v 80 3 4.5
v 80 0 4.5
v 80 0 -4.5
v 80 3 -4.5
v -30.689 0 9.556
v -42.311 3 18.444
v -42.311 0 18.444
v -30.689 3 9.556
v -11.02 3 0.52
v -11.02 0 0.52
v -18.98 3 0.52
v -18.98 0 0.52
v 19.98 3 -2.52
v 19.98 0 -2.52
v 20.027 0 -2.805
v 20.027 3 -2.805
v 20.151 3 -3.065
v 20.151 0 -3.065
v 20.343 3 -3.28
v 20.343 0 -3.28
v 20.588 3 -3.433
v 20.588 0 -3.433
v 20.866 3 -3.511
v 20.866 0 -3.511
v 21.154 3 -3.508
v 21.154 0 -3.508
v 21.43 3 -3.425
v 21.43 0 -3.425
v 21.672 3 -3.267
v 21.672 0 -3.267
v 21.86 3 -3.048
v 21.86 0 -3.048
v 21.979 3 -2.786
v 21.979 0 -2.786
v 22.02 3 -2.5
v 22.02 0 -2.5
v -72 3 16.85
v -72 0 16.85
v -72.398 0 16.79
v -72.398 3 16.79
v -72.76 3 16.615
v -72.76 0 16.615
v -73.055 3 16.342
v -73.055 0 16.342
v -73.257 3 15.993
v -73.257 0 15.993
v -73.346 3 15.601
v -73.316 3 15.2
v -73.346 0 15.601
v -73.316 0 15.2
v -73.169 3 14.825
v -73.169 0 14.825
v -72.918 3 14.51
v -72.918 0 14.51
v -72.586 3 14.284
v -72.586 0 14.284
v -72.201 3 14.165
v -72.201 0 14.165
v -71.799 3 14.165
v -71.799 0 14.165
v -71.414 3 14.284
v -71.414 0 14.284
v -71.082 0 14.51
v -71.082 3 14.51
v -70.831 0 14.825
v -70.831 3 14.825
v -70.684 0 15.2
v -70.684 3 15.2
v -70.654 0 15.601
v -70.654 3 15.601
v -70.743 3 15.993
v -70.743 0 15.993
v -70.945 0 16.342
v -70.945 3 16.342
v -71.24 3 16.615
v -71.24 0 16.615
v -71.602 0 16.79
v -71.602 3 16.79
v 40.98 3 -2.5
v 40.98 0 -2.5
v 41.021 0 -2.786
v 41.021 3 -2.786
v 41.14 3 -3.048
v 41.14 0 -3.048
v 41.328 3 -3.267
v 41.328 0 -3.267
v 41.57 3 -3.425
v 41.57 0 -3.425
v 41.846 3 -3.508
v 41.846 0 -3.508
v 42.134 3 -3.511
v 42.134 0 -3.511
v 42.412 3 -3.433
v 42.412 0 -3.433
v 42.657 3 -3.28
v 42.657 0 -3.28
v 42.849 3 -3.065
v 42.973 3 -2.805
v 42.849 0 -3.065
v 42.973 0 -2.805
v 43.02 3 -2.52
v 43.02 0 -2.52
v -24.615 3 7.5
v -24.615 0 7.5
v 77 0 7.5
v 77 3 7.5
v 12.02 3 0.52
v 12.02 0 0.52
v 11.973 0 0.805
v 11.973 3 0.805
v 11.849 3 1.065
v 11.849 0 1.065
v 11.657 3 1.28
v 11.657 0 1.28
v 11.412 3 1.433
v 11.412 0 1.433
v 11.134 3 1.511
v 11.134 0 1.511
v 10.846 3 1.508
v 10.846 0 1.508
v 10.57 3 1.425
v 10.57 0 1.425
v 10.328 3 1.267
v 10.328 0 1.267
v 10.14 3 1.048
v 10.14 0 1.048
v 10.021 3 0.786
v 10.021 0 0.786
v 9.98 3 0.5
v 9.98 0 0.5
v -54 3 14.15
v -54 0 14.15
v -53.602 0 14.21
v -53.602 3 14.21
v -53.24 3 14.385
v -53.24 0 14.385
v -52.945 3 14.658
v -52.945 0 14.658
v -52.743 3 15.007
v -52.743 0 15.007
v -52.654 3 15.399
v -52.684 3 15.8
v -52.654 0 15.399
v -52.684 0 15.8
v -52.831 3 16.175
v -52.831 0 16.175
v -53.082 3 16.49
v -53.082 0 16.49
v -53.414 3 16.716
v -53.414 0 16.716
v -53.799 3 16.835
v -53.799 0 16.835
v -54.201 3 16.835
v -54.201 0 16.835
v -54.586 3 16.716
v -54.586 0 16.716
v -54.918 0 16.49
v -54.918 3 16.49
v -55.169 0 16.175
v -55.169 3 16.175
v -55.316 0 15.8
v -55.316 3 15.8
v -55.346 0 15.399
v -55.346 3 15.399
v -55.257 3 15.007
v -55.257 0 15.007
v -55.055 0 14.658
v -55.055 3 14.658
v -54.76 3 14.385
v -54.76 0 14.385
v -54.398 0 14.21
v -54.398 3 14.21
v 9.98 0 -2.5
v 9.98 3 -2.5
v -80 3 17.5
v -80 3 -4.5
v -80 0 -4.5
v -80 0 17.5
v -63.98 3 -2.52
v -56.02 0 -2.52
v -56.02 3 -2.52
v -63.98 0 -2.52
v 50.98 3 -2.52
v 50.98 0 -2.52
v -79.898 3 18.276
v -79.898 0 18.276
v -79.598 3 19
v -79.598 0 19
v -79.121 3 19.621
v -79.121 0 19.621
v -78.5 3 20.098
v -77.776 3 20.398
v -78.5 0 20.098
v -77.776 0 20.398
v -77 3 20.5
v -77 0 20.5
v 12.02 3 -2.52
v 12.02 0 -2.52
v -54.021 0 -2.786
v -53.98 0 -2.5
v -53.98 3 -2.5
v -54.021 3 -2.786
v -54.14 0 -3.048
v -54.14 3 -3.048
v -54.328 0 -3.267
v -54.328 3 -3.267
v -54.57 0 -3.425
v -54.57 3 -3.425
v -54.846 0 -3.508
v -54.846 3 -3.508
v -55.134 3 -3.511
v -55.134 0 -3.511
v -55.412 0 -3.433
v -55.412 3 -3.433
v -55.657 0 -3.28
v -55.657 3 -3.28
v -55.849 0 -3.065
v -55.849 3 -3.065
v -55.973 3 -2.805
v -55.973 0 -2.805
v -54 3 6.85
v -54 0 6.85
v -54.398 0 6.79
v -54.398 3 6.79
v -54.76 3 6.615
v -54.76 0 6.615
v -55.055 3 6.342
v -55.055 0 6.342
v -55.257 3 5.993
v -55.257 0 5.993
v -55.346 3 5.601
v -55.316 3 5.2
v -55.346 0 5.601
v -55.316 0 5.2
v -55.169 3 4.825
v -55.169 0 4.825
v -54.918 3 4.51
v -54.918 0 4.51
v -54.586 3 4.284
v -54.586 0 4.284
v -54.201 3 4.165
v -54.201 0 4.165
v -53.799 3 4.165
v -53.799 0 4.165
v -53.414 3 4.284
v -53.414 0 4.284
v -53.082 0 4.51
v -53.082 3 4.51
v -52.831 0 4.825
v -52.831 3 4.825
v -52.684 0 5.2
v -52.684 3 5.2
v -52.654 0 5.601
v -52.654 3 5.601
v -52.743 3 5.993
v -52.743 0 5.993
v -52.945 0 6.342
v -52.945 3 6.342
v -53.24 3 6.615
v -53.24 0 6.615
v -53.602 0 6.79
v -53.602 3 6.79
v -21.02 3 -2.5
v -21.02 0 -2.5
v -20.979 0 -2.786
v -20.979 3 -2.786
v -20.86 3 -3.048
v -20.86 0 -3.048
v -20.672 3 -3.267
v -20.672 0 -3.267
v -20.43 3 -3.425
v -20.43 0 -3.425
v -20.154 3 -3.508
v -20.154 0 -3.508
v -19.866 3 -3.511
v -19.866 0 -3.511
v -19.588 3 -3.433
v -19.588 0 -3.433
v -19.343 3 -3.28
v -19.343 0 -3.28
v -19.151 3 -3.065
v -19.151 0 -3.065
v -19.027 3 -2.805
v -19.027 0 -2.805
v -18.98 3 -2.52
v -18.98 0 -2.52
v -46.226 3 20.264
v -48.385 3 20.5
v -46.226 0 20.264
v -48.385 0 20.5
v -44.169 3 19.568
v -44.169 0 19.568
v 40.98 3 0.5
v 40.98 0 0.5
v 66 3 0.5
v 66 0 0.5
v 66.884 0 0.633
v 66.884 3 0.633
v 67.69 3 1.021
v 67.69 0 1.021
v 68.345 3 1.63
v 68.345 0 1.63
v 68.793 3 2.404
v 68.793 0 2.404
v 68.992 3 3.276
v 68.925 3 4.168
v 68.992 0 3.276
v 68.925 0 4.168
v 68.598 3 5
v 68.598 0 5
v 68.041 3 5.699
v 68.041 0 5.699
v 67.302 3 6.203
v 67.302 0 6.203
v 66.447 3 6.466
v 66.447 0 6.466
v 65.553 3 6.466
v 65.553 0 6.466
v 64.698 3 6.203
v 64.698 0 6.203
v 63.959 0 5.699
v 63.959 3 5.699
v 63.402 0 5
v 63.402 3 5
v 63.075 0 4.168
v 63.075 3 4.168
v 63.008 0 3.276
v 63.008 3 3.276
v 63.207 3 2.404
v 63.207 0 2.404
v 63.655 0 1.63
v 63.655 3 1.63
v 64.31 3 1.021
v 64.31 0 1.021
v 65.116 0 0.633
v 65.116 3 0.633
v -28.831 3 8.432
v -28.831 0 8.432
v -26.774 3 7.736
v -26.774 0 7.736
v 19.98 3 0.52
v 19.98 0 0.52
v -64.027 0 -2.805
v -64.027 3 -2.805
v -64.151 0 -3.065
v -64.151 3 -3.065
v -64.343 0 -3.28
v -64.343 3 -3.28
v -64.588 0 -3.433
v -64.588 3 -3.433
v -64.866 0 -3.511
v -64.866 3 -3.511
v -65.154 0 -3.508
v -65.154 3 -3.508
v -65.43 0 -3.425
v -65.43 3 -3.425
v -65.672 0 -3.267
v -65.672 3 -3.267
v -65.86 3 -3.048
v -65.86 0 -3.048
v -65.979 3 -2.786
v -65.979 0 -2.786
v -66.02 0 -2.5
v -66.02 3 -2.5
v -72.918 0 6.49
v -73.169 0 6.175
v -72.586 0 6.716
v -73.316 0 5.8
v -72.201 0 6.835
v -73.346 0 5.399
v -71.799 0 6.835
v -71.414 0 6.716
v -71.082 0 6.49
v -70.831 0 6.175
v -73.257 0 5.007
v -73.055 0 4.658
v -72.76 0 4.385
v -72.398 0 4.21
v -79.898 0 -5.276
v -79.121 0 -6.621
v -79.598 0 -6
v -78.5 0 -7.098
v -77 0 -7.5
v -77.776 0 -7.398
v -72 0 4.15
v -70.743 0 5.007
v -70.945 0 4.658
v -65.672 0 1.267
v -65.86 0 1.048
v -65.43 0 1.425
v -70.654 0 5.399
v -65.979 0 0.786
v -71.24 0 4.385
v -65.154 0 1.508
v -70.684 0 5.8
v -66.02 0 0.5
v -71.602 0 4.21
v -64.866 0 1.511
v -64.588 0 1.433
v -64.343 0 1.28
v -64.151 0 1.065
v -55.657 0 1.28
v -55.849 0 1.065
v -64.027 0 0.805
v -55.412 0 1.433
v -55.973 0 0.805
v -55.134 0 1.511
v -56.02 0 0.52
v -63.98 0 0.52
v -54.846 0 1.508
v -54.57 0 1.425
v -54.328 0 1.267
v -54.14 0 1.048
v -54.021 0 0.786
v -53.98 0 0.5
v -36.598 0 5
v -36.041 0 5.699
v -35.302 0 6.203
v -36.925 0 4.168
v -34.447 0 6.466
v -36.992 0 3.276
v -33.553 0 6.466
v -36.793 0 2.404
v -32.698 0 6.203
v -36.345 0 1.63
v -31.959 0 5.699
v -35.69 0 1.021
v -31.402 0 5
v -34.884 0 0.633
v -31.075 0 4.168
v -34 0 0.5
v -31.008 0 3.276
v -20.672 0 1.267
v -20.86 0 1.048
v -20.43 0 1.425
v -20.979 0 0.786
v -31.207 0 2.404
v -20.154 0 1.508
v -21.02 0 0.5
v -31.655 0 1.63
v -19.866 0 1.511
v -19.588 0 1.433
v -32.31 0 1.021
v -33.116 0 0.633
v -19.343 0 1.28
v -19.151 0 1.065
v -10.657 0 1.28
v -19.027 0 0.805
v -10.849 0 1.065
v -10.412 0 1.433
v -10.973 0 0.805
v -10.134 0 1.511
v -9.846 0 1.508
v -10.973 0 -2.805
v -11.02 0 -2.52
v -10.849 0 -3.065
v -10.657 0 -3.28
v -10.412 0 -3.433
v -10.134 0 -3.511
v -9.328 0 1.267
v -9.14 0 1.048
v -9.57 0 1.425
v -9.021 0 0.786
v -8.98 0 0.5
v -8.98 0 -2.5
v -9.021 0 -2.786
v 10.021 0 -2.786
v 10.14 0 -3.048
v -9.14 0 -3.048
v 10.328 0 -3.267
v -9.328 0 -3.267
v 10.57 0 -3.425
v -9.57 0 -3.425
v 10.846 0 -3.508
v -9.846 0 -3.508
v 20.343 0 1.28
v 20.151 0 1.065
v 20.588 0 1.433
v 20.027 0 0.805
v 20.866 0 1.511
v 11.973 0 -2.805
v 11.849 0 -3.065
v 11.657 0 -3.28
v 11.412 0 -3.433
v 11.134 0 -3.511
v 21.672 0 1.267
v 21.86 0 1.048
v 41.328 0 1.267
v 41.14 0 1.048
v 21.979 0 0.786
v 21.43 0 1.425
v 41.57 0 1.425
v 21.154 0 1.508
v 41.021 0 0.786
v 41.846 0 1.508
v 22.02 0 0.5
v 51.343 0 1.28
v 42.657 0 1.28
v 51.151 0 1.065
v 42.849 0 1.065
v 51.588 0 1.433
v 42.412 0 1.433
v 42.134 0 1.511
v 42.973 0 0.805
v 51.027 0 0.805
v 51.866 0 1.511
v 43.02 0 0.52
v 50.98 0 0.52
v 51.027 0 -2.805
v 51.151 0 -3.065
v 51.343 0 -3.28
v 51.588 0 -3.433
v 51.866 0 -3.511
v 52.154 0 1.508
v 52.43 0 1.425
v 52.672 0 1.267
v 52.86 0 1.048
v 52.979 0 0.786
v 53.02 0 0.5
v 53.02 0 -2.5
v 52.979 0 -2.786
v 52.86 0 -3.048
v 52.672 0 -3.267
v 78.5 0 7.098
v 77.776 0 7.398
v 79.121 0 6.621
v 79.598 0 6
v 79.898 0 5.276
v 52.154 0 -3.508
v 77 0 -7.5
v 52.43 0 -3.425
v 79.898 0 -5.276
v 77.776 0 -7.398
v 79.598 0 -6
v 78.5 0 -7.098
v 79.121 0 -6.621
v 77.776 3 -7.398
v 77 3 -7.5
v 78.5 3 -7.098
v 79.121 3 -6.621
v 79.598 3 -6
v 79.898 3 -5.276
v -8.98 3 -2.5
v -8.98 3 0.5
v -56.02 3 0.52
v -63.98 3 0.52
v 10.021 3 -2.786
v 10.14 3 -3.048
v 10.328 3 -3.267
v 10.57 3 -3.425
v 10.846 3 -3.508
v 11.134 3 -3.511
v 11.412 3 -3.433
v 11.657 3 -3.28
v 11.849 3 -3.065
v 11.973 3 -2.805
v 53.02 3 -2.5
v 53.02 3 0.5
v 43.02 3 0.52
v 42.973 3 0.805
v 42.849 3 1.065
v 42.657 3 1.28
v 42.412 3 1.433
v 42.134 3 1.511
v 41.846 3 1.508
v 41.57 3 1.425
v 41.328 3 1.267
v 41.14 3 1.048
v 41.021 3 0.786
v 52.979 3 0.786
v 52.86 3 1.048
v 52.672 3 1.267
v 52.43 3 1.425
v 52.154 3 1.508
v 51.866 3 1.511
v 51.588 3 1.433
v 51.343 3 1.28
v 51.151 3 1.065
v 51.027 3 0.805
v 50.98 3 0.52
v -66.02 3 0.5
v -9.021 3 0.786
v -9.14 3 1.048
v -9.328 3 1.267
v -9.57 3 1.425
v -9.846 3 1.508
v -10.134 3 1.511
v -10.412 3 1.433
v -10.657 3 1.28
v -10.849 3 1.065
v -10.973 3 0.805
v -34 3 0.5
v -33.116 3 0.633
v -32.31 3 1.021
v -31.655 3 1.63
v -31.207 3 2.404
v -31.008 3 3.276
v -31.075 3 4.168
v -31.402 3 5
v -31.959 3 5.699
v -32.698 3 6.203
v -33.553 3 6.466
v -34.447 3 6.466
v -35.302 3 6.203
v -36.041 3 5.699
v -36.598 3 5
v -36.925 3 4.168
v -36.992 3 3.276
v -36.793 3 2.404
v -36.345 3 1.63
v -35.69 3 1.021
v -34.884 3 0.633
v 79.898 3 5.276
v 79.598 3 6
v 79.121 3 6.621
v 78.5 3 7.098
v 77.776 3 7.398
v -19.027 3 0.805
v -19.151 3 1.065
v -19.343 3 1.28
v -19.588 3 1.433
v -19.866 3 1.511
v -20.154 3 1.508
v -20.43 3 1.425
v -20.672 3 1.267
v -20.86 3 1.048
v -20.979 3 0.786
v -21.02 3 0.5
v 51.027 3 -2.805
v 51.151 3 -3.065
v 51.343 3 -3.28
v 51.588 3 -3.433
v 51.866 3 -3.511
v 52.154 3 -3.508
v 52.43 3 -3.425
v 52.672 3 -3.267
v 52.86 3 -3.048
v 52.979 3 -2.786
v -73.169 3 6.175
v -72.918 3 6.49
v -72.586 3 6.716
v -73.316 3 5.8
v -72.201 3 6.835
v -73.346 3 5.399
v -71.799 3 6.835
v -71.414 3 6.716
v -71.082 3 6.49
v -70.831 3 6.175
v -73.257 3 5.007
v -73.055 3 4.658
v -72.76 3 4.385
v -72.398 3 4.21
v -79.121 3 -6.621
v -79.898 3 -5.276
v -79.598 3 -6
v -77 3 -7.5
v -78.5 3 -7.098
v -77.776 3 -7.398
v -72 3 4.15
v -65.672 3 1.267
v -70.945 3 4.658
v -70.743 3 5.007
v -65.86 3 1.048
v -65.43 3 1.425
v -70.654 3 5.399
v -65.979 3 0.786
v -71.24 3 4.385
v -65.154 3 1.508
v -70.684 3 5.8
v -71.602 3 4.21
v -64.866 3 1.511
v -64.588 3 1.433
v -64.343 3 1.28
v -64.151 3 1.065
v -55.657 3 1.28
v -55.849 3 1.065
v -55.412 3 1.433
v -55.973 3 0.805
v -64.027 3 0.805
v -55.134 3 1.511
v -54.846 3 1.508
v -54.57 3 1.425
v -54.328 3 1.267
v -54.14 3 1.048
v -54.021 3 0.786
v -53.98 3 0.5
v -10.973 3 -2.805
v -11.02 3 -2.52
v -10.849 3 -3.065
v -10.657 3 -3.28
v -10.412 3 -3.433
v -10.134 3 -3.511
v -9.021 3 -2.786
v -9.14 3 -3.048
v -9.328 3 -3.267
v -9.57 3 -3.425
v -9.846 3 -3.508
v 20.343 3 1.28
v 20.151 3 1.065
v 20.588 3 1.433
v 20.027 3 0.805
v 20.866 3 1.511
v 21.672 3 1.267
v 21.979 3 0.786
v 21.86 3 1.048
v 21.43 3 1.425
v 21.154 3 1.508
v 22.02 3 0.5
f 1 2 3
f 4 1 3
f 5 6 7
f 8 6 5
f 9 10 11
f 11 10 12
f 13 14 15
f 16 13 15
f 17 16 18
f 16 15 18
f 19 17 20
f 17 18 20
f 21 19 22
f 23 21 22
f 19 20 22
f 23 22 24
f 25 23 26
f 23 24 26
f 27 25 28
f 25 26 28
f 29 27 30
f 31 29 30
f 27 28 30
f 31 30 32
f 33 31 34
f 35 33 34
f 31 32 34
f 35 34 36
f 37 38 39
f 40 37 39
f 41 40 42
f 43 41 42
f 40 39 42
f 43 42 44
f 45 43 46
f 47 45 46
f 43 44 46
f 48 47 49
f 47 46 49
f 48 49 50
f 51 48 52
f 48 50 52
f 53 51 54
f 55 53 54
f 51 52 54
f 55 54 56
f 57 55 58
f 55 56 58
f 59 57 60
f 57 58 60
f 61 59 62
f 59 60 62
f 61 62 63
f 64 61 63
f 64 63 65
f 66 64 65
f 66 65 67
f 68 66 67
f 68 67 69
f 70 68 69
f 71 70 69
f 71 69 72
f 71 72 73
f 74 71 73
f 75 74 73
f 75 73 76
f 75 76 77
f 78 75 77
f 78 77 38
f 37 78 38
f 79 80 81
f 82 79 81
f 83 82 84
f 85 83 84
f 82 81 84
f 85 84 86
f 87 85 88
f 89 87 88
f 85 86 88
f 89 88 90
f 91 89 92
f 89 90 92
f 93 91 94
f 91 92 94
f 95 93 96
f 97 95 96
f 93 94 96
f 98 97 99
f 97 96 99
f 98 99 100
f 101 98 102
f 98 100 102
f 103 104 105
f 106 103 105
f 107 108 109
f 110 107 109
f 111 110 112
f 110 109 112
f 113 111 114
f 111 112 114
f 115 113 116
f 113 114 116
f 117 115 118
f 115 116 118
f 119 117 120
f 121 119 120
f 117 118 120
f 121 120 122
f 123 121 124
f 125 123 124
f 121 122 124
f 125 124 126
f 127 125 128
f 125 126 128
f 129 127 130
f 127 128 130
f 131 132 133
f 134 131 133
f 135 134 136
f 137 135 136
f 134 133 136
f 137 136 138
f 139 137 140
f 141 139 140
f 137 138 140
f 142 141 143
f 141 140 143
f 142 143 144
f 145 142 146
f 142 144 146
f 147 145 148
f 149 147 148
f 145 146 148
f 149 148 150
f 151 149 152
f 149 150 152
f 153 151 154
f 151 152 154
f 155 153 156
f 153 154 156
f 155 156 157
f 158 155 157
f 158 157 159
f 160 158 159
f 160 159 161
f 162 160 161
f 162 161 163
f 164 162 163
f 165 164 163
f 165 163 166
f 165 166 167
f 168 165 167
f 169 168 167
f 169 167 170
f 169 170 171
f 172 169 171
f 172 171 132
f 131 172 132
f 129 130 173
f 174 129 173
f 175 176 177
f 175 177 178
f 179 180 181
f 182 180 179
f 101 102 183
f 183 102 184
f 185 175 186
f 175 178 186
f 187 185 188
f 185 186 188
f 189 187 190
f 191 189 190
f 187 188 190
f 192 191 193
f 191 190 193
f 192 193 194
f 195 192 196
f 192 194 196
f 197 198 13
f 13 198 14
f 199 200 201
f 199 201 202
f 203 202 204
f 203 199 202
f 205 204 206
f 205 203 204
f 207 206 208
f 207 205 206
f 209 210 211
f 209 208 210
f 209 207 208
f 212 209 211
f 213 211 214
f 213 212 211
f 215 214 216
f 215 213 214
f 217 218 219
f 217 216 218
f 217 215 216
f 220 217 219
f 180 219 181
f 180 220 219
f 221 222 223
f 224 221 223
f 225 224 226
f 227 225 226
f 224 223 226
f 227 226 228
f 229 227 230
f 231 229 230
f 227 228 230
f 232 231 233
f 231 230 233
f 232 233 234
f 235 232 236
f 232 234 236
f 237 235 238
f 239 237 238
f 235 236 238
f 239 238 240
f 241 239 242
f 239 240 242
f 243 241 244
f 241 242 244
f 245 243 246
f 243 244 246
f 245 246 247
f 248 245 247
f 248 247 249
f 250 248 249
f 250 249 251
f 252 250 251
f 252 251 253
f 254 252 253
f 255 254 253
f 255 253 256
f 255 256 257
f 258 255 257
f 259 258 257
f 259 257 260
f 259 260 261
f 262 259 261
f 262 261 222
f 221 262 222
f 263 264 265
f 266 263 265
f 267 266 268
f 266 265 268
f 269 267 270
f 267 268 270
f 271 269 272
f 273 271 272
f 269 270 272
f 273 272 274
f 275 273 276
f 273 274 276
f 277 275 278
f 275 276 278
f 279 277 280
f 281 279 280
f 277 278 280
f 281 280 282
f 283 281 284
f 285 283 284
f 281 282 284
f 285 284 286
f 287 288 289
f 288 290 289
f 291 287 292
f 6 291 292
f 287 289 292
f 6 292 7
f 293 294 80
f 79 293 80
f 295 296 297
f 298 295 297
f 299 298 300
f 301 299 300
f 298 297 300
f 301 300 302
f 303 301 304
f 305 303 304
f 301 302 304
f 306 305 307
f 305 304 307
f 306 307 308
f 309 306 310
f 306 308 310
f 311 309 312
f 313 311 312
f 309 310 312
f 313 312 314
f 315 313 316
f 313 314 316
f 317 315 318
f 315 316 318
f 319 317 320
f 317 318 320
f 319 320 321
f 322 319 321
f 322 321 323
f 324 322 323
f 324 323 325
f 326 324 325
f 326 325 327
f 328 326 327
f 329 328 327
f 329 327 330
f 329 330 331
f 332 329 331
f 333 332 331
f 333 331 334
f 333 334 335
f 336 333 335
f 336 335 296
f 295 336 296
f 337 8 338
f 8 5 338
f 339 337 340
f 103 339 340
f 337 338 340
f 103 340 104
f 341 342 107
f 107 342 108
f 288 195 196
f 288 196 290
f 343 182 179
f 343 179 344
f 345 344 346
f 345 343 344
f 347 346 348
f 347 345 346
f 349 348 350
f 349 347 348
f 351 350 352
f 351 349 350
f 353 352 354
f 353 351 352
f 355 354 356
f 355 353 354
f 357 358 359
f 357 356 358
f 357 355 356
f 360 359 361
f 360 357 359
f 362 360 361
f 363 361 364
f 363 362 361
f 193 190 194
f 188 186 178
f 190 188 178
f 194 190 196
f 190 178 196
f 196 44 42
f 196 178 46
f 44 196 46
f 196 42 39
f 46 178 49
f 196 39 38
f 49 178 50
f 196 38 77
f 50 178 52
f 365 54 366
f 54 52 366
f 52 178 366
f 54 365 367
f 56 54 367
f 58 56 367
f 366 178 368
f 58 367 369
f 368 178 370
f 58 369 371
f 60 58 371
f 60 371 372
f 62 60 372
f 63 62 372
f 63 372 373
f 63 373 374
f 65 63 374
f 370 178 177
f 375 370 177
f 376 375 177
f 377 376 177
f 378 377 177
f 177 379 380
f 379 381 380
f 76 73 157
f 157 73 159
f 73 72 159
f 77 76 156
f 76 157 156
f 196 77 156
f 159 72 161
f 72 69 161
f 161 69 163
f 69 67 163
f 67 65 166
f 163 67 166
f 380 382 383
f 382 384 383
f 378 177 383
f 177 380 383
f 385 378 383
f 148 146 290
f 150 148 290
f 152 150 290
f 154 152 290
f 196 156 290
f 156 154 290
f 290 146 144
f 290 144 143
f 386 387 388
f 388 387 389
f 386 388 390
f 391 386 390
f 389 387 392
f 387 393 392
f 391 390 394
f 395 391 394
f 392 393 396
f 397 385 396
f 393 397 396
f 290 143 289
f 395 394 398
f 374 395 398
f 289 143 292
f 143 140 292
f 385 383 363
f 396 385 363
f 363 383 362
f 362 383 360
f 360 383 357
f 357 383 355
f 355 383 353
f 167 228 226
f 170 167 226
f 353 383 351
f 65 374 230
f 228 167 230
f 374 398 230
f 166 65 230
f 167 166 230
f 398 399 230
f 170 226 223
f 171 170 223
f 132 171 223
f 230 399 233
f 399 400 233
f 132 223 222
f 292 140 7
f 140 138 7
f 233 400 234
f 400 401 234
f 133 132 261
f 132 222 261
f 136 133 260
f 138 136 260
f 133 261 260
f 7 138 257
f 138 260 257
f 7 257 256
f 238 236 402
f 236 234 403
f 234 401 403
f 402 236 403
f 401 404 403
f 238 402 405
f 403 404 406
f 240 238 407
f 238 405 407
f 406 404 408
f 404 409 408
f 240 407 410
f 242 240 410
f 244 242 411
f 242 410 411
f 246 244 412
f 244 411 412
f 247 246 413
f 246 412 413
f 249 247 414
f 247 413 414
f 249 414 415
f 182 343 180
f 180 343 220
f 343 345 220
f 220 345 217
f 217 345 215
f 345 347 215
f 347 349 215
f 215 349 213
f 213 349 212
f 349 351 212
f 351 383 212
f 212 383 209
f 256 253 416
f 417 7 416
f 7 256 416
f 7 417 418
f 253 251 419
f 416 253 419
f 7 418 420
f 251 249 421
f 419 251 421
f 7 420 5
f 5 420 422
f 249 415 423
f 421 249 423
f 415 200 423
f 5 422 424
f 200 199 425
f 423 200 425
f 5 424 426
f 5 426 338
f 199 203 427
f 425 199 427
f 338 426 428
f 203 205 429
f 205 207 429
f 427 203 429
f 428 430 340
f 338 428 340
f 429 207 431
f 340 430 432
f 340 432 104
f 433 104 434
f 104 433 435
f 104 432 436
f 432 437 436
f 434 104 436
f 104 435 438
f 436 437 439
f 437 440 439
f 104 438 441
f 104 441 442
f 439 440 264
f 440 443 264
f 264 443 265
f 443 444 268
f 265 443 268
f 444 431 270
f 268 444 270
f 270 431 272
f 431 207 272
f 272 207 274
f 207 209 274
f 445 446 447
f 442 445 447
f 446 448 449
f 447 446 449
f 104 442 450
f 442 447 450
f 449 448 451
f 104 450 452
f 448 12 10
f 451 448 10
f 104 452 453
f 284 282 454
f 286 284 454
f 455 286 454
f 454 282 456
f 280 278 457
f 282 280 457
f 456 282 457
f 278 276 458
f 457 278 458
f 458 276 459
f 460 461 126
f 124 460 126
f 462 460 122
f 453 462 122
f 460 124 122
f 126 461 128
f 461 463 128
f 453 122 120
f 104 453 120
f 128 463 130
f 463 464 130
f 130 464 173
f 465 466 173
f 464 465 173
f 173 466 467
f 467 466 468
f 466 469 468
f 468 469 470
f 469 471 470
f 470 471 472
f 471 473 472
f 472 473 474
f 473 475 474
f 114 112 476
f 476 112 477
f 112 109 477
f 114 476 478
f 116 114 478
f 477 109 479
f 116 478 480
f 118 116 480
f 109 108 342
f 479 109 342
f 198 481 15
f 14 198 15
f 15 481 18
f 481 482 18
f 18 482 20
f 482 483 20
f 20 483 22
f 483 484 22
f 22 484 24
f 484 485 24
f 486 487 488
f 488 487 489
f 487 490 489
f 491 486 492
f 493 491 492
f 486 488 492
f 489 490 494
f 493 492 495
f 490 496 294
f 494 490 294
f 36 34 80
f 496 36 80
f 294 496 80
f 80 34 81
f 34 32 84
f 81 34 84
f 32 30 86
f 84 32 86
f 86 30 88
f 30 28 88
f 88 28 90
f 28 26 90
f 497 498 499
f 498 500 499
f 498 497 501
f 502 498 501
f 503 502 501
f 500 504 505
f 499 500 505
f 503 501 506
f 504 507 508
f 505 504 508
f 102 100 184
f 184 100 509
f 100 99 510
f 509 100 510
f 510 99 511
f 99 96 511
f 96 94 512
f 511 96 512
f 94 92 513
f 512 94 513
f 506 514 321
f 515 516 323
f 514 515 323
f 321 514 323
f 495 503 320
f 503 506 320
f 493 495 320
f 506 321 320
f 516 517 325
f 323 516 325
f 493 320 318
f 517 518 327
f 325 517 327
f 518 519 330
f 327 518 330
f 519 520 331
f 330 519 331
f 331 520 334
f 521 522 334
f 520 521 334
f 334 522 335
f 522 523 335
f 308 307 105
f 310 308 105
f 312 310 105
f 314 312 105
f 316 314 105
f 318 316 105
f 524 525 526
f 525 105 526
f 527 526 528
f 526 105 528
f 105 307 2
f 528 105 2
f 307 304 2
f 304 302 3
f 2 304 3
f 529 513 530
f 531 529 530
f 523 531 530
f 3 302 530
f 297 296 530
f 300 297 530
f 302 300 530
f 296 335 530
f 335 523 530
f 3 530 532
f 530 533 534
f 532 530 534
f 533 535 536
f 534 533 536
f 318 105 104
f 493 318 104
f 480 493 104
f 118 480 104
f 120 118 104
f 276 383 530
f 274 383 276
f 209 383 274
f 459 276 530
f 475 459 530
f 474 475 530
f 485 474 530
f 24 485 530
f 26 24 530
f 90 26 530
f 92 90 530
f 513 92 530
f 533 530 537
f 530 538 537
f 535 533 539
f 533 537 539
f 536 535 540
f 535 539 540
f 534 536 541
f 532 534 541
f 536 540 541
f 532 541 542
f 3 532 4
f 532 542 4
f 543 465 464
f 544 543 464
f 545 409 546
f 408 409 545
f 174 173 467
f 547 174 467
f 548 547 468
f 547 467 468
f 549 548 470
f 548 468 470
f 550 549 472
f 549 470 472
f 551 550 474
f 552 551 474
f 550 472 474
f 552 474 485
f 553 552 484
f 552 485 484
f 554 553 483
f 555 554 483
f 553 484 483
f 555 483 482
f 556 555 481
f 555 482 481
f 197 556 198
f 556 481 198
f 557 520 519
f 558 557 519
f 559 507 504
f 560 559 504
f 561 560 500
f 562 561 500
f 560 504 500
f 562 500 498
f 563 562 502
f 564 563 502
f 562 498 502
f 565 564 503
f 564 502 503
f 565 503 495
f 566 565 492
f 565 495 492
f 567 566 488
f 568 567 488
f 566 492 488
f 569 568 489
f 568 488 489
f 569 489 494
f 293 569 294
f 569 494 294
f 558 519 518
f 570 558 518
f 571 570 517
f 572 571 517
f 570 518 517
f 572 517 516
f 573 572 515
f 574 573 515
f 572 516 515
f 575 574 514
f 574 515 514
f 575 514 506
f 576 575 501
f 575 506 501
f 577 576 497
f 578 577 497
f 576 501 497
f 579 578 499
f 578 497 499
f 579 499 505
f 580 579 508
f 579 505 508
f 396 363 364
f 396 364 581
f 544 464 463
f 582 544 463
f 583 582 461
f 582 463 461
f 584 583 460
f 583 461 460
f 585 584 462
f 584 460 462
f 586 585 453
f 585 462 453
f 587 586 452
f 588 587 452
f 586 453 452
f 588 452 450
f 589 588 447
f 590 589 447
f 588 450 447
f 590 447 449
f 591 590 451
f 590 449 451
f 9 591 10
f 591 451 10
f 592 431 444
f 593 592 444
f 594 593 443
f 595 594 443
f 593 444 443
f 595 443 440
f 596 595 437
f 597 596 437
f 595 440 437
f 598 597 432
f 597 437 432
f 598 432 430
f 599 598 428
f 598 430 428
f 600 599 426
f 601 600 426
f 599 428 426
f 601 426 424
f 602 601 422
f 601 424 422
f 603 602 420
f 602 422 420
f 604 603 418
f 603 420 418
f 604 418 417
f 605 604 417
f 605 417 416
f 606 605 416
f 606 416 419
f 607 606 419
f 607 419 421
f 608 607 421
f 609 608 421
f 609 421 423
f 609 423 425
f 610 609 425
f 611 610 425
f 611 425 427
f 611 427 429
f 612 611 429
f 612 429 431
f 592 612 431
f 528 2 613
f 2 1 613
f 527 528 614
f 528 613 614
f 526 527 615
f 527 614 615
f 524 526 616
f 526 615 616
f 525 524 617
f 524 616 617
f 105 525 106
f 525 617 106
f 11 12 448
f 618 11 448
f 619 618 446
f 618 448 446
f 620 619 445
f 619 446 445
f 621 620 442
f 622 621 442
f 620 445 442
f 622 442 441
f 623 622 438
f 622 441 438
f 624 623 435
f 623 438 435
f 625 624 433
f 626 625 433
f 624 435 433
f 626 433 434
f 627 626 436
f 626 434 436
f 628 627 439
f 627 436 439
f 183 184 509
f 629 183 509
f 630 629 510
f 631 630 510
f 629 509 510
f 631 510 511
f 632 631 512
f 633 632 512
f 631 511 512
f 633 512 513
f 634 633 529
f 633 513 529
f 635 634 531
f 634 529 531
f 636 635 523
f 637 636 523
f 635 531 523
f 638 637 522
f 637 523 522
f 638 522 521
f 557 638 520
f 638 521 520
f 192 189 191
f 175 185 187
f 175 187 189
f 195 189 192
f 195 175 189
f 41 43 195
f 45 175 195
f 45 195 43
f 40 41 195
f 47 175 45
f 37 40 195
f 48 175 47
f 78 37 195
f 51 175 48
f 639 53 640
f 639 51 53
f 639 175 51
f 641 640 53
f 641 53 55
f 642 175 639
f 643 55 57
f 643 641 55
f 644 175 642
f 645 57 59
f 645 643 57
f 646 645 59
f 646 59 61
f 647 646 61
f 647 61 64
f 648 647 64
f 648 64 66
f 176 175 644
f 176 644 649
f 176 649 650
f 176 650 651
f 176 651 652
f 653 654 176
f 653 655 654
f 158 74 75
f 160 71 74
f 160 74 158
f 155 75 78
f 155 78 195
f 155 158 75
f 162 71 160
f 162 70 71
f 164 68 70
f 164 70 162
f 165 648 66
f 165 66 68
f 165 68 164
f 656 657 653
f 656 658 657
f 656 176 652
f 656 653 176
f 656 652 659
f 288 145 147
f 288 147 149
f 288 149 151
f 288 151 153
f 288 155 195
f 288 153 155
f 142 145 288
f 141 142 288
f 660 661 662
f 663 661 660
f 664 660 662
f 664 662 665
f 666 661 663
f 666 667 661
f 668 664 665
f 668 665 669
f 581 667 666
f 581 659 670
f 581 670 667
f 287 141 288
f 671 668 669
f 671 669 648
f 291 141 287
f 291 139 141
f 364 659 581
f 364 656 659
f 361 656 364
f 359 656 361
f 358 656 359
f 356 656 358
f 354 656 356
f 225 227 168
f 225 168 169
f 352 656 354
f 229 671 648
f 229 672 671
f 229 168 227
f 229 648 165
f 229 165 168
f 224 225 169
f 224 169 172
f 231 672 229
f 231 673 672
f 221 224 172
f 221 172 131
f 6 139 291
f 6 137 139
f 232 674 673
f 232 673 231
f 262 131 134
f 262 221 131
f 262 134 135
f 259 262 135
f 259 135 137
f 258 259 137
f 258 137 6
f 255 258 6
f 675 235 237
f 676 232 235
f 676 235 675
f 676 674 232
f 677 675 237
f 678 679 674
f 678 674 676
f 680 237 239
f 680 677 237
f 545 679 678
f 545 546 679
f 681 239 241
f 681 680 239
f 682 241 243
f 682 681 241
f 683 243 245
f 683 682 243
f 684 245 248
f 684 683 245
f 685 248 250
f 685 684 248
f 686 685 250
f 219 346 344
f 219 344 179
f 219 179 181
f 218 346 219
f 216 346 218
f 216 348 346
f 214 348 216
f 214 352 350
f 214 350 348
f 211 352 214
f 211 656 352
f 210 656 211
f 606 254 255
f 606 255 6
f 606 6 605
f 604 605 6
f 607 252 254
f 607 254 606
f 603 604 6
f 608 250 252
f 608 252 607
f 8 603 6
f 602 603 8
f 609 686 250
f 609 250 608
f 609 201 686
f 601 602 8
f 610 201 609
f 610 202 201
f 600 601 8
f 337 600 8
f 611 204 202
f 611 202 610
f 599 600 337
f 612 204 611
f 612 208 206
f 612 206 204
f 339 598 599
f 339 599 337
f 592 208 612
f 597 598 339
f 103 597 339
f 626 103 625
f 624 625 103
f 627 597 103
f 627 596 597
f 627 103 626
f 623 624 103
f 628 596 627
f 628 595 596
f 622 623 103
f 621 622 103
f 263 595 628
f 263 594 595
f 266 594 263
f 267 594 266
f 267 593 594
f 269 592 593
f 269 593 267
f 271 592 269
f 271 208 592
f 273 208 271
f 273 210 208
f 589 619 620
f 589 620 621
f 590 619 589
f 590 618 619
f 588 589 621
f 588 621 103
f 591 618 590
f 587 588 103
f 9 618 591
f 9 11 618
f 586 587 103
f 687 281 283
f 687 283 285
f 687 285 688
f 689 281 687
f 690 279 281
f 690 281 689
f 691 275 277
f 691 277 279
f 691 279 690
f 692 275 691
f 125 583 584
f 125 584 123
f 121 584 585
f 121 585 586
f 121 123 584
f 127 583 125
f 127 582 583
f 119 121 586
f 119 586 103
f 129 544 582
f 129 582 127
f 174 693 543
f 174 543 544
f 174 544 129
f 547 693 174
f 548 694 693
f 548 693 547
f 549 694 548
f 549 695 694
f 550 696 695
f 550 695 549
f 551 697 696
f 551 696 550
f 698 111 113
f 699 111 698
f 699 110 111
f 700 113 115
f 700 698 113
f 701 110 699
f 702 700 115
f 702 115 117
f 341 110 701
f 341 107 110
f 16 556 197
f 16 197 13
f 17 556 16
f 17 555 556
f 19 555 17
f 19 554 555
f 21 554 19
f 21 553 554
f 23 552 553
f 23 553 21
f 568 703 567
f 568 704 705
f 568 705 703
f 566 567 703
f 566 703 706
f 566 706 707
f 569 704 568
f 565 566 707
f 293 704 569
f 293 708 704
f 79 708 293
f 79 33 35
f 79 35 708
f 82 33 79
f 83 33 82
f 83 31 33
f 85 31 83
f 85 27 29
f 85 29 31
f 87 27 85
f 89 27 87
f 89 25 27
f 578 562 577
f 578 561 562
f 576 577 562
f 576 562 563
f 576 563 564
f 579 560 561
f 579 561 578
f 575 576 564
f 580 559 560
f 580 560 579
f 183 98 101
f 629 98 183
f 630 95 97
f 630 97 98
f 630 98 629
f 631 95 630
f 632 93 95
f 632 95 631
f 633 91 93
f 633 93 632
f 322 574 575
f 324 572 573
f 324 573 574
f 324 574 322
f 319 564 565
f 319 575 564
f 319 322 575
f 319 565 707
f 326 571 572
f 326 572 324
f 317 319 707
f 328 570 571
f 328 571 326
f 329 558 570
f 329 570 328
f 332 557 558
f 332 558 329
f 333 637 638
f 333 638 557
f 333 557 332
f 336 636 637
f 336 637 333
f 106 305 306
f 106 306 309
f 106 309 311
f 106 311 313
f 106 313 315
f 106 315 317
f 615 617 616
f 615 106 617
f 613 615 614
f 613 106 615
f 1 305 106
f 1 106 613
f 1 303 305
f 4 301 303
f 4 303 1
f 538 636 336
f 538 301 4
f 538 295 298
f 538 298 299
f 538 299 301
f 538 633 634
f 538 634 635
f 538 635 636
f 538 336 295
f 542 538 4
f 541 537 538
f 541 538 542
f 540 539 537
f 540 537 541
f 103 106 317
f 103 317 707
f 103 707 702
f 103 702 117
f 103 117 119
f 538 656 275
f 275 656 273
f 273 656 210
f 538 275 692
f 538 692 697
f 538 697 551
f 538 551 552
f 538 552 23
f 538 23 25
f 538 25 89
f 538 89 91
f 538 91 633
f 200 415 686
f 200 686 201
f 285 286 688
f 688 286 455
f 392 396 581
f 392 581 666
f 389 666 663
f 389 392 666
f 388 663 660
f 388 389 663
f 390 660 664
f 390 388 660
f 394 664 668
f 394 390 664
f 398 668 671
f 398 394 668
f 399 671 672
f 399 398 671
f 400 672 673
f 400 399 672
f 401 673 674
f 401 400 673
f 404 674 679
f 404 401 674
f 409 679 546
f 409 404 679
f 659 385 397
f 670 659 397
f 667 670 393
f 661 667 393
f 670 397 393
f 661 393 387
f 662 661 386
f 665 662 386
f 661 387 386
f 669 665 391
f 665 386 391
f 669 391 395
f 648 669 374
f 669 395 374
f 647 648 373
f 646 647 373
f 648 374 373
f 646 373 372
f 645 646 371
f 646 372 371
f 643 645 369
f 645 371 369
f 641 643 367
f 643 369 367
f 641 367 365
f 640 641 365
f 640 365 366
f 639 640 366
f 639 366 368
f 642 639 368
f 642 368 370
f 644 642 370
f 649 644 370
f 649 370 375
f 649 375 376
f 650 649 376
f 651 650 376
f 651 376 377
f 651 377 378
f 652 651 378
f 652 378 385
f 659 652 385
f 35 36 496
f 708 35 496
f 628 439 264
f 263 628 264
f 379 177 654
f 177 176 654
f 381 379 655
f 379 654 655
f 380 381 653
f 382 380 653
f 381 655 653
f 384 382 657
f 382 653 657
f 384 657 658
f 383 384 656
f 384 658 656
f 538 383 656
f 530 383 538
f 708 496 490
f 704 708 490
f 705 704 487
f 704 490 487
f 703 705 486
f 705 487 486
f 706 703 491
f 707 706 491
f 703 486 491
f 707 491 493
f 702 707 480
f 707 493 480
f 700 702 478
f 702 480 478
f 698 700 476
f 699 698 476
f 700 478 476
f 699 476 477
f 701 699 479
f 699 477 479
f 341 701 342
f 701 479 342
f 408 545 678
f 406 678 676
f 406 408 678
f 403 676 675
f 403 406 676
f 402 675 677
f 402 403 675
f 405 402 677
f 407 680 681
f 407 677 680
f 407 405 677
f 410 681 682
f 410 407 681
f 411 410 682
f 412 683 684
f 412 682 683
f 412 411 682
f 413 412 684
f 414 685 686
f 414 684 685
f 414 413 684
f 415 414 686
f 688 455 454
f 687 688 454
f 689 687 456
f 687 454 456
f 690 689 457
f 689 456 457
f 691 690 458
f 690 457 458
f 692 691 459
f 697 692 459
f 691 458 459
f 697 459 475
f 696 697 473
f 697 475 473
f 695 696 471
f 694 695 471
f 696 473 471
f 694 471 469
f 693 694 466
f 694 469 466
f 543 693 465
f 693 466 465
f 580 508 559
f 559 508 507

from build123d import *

# Parameters (mm, degrees)
SKETCH_1_W          = 160
SKETCH_1_H          = 15
EXTRUDE_1_DEPTH     = 3
EXTRUDE_2_DEPTH     = 3
SKETCH_3_W          = 12
SKETCH_3_H          = 3
CUT_EXTRUDE_1_DEPTH = 83.639276376
SKETCH_4_R          = 1
CUT_EXTRUDE_2_DEPTH = 83.639276376
CUT_EXTRUDE_4_DEPTH = 83.639276376
FILLET_1_R          = 3
FILLET_2_R          = 10
SKETCH_7_R          = 3
CUT_EXTRUDE_5_DEPTH = 83.639276376
SKETCH_8_R          = 1.35
CUT_EXTRUDE_6_DEPTH = 83.639276376


with BuildPart() as part:
    # 草图1 → 凸台-拉伸1 (new body)
    with BuildSketch(Plane(origin=(0, 0, 0), x_dir=(1, 0, 0), z_dir=(0, 1, 0))):
        Rectangle(SKETCH_1_W, SKETCH_1_H)
    extrude(amount=EXTRUDE_1_DEPTH)

    # 草图2 → 凸台-拉伸2 (add)
    with BuildSketch(Plane(origin=(0, 3, 0), x_dir=(1, 0, 0), z_dir=(0, 1, 0))):
        Polygon((-28, -7.5), (-80, -7.5), (-80, -20.5), (-45, -20.5), align=None)
    extrude(amount=-EXTRUDE_2_DEPTH)

    # 草图3 → 切除-拉伸1 (cut, through all)
    with BuildSketch(Plane.XZ):
        with Locations((16, -1)):
            Rectangle(SKETCH_3_W, SKETCH_3_H)
        with Locations((47, -1)):
            Rectangle(SKETCH_3_W, SKETCH_3_H)
        with Locations((-15, -1)):
            Rectangle(SKETCH_3_W, SKETCH_3_H)
        with Locations((-60, -1)):
            Rectangle(SKETCH_3_W, SKETCH_3_H)
    extrude(amount=-CUT_EXTRUDE_1_DEPTH, mode=Mode.SUBTRACT)

    # 草图4 → 切除-拉伸2 (cut, through all)
    with BuildSketch(Plane.XZ):
        with Locations((52, -2.5)):
            Circle(SKETCH_4_R)
        with Locations((42, -2.5)):
            Circle(SKETCH_4_R)
        with Locations((21, -2.5)):
            Circle(SKETCH_4_R)
        with Locations((11, -2.5)):
            Circle(SKETCH_4_R)
        with Locations((-10, -2.5)):
            Circle(SKETCH_4_R)
        with Locations((-20, -2.5)):
            Circle(SKETCH_4_R)
        with Locations((-65, -2.5)):
            Circle(SKETCH_4_R)
        with Locations((-55, -2.5)):
            Circle(SKETCH_4_R)
        with Locations((-55, 0.5)):
            Circle(SKETCH_4_R)
        with Locations((-65, 0.5)):
            Circle(SKETCH_4_R)
        with Locations((-20, 0.5)):
            Circle(SKETCH_4_R)
        with Locations((-10, 0.5)):
            Circle(SKETCH_4_R)
        with Locations((11, 0.5)):
            Circle(SKETCH_4_R)
        with Locations((21, 0.5)):
            Circle(SKETCH_4_R)
        with Locations((42, 0.5)):
            Circle(SKETCH_4_R)
        with Locations((52, 0.5)):
            Circle(SKETCH_4_R)
    extrude(amount=-CUT_EXTRUDE_2_DEPTH, mode=Mode.SUBTRACT)

    # 草图5 → 切除-拉伸4 (cut, through all)
    with BuildSketch(Plane.XZ):
        with BuildLine():
            Line((19.980196097, 0.52), (12.019803903, 0.52))
            ThreePointArc((12.019803903, 0.52), (10.989999519, 1.519950975), (9.98, 0.5))
            Line((9.98, 0.5), (9.98, -2.5))
            ThreePointArc((9.98, -2.5), (10.989999519, -3.519950975), (12.019803903, -2.52))
            Line((12.019803903, -2.52), (19.980196097, -2.52))
            ThreePointArc((19.980196097, -2.52), (21.010000481, -3.519950975), (22.02, -2.5))
            Line((22.02, -2.5), (22.02, 0.5))
            ThreePointArc((22.02, 0.5), (21.010000481, 1.519950975), (19.980196097, 0.52))
        make_face()
        with BuildLine():
            Line((53.02, -2.5), (53.02, 0.5))
            ThreePointArc((53.02, 0.5), (52.010000481, 1.519950975), (50.980196097, 0.52))
            Line((50.980196097, 0.52), (43.019803903, 0.52))
            ThreePointArc((43.019803903, 0.52), (41.989999519, 1.519950975), (40.98, 0.5))
            Line((40.98, 0.5), (40.98, -2.5))
            ThreePointArc((40.98, -2.5), (41.989999519, -3.519950975), (43.019803903, -2.52))
            Line((43.019803903, -2.52), (50.980196097, -2.52))
            ThreePointArc((50.980196097, -2.52), (52.010000481, -3.519950975), (53.02, -2.5))
        make_face()
        with BuildLine():
            Line((-11.019803903, 0.52), (-18.980196097, 0.52))
            ThreePointArc((-18.980196097, 0.52), (-20.010000481, 1.519950975), (-21.02, 0.5))
            Line((-21.02, 0.5), (-21.02, -2.5))
            ThreePointArc((-21.02, -2.5), (-20.010000481, -3.519950975), (-18.980196097, -2.52))
            Line((-18.980196097, -2.52), (-11.019803903, -2.52))
            ThreePointArc((-11.019803903, -2.52), (-9.989999519, -3.519950975), (-8.98, -2.5))
            Line((-8.98, -2.5), (-8.98, 0.5))
            ThreePointArc((-8.98, 0.5), (-9.989999519, 1.519950975), (-11.019803903, 0.52))
        make_face()
        with BuildLine():
            Line((-66.02, -2.5), (-66.02, 0.5))
            ThreePointArc((-66.02, 0.5), (-65.010000481, 1.519950975), (-63.980196097, 0.52))
            Line((-63.980196097, 0.52), (-56.019803903, 0.52))
            ThreePointArc((-56.019803903, 0.52), (-54.989999519, 1.519950975), (-53.98, 0.5))
            Line((-53.98, 0.5), (-53.98, -2.5))
            ThreePointArc((-53.98, -2.5), (-54.989999519, -3.519950975), (-56.019803903, -2.52))
            Line((-56.019803903, -2.52), (-63.980196097, -2.52))
            ThreePointArc((-63.980196097, -2.52), (-65.010000481, -3.519950975), (-66.02, -2.5))
        make_face()
    extrude(amount=-CUT_EXTRUDE_4_DEPTH, mode=Mode.SUBTRACT)

    # 圆角1
    fillet_1_edges = [part.edges().sort_by_distance(p)[0] for p in [
        (-80, 1.5, 20.5),
        (80, 1.5, 7.5),
        (-80, 1.5, -7.5),
        (80, 1.5, -7.5),
    ]]
    fillet(fillet_1_edges, radius=FILLET_1_R)

    # 圆角2
    fillet_2_edges = [part.edges().sort_by_distance(p)[0] for p in [
        (-28, 1.5, 7.5),
        (-45, 1.5, 20.5),
    ]]
    fillet(fillet_2_edges, radius=FILLET_2_R)

    # 草图7 → 切除-拉伸5 (cut, through all)
    with BuildSketch(Plane.XZ):
        with Locations(Location((66, 3.5, 0), (0, 0, 270))):
            Circle(SKETCH_7_R)
        with Locations(Location((-34, 3.5, 0), (0, 0, 270))):
            Circle(SKETCH_7_R)
    extrude(amount=-CUT_EXTRUDE_5_DEPTH, mode=Mode.SUBTRACT)

    # 草图8 → 切除-拉伸6 (cut, through all)
    with BuildSketch(Plane.XZ):
        with Locations(Location((-72, 5.5, 0), (0, 0, 270))):
            Circle(SKETCH_8_R)
        with Locations(Location((-72, 15.5, 0), (0, 0, 90))):
            Circle(SKETCH_8_R)
        with Locations(Location((-54, 15.5, 0), (0, 0, 270))):
            Circle(SKETCH_8_R)
        with Locations(Location((-54, 5.5, 0), (0, 0, 90))):
            Circle(SKETCH_8_R)
    extrude(amount=-CUT_EXTRUDE_6_DEPTH, mode=Mode.SUBTRACT)


solid = part.part
